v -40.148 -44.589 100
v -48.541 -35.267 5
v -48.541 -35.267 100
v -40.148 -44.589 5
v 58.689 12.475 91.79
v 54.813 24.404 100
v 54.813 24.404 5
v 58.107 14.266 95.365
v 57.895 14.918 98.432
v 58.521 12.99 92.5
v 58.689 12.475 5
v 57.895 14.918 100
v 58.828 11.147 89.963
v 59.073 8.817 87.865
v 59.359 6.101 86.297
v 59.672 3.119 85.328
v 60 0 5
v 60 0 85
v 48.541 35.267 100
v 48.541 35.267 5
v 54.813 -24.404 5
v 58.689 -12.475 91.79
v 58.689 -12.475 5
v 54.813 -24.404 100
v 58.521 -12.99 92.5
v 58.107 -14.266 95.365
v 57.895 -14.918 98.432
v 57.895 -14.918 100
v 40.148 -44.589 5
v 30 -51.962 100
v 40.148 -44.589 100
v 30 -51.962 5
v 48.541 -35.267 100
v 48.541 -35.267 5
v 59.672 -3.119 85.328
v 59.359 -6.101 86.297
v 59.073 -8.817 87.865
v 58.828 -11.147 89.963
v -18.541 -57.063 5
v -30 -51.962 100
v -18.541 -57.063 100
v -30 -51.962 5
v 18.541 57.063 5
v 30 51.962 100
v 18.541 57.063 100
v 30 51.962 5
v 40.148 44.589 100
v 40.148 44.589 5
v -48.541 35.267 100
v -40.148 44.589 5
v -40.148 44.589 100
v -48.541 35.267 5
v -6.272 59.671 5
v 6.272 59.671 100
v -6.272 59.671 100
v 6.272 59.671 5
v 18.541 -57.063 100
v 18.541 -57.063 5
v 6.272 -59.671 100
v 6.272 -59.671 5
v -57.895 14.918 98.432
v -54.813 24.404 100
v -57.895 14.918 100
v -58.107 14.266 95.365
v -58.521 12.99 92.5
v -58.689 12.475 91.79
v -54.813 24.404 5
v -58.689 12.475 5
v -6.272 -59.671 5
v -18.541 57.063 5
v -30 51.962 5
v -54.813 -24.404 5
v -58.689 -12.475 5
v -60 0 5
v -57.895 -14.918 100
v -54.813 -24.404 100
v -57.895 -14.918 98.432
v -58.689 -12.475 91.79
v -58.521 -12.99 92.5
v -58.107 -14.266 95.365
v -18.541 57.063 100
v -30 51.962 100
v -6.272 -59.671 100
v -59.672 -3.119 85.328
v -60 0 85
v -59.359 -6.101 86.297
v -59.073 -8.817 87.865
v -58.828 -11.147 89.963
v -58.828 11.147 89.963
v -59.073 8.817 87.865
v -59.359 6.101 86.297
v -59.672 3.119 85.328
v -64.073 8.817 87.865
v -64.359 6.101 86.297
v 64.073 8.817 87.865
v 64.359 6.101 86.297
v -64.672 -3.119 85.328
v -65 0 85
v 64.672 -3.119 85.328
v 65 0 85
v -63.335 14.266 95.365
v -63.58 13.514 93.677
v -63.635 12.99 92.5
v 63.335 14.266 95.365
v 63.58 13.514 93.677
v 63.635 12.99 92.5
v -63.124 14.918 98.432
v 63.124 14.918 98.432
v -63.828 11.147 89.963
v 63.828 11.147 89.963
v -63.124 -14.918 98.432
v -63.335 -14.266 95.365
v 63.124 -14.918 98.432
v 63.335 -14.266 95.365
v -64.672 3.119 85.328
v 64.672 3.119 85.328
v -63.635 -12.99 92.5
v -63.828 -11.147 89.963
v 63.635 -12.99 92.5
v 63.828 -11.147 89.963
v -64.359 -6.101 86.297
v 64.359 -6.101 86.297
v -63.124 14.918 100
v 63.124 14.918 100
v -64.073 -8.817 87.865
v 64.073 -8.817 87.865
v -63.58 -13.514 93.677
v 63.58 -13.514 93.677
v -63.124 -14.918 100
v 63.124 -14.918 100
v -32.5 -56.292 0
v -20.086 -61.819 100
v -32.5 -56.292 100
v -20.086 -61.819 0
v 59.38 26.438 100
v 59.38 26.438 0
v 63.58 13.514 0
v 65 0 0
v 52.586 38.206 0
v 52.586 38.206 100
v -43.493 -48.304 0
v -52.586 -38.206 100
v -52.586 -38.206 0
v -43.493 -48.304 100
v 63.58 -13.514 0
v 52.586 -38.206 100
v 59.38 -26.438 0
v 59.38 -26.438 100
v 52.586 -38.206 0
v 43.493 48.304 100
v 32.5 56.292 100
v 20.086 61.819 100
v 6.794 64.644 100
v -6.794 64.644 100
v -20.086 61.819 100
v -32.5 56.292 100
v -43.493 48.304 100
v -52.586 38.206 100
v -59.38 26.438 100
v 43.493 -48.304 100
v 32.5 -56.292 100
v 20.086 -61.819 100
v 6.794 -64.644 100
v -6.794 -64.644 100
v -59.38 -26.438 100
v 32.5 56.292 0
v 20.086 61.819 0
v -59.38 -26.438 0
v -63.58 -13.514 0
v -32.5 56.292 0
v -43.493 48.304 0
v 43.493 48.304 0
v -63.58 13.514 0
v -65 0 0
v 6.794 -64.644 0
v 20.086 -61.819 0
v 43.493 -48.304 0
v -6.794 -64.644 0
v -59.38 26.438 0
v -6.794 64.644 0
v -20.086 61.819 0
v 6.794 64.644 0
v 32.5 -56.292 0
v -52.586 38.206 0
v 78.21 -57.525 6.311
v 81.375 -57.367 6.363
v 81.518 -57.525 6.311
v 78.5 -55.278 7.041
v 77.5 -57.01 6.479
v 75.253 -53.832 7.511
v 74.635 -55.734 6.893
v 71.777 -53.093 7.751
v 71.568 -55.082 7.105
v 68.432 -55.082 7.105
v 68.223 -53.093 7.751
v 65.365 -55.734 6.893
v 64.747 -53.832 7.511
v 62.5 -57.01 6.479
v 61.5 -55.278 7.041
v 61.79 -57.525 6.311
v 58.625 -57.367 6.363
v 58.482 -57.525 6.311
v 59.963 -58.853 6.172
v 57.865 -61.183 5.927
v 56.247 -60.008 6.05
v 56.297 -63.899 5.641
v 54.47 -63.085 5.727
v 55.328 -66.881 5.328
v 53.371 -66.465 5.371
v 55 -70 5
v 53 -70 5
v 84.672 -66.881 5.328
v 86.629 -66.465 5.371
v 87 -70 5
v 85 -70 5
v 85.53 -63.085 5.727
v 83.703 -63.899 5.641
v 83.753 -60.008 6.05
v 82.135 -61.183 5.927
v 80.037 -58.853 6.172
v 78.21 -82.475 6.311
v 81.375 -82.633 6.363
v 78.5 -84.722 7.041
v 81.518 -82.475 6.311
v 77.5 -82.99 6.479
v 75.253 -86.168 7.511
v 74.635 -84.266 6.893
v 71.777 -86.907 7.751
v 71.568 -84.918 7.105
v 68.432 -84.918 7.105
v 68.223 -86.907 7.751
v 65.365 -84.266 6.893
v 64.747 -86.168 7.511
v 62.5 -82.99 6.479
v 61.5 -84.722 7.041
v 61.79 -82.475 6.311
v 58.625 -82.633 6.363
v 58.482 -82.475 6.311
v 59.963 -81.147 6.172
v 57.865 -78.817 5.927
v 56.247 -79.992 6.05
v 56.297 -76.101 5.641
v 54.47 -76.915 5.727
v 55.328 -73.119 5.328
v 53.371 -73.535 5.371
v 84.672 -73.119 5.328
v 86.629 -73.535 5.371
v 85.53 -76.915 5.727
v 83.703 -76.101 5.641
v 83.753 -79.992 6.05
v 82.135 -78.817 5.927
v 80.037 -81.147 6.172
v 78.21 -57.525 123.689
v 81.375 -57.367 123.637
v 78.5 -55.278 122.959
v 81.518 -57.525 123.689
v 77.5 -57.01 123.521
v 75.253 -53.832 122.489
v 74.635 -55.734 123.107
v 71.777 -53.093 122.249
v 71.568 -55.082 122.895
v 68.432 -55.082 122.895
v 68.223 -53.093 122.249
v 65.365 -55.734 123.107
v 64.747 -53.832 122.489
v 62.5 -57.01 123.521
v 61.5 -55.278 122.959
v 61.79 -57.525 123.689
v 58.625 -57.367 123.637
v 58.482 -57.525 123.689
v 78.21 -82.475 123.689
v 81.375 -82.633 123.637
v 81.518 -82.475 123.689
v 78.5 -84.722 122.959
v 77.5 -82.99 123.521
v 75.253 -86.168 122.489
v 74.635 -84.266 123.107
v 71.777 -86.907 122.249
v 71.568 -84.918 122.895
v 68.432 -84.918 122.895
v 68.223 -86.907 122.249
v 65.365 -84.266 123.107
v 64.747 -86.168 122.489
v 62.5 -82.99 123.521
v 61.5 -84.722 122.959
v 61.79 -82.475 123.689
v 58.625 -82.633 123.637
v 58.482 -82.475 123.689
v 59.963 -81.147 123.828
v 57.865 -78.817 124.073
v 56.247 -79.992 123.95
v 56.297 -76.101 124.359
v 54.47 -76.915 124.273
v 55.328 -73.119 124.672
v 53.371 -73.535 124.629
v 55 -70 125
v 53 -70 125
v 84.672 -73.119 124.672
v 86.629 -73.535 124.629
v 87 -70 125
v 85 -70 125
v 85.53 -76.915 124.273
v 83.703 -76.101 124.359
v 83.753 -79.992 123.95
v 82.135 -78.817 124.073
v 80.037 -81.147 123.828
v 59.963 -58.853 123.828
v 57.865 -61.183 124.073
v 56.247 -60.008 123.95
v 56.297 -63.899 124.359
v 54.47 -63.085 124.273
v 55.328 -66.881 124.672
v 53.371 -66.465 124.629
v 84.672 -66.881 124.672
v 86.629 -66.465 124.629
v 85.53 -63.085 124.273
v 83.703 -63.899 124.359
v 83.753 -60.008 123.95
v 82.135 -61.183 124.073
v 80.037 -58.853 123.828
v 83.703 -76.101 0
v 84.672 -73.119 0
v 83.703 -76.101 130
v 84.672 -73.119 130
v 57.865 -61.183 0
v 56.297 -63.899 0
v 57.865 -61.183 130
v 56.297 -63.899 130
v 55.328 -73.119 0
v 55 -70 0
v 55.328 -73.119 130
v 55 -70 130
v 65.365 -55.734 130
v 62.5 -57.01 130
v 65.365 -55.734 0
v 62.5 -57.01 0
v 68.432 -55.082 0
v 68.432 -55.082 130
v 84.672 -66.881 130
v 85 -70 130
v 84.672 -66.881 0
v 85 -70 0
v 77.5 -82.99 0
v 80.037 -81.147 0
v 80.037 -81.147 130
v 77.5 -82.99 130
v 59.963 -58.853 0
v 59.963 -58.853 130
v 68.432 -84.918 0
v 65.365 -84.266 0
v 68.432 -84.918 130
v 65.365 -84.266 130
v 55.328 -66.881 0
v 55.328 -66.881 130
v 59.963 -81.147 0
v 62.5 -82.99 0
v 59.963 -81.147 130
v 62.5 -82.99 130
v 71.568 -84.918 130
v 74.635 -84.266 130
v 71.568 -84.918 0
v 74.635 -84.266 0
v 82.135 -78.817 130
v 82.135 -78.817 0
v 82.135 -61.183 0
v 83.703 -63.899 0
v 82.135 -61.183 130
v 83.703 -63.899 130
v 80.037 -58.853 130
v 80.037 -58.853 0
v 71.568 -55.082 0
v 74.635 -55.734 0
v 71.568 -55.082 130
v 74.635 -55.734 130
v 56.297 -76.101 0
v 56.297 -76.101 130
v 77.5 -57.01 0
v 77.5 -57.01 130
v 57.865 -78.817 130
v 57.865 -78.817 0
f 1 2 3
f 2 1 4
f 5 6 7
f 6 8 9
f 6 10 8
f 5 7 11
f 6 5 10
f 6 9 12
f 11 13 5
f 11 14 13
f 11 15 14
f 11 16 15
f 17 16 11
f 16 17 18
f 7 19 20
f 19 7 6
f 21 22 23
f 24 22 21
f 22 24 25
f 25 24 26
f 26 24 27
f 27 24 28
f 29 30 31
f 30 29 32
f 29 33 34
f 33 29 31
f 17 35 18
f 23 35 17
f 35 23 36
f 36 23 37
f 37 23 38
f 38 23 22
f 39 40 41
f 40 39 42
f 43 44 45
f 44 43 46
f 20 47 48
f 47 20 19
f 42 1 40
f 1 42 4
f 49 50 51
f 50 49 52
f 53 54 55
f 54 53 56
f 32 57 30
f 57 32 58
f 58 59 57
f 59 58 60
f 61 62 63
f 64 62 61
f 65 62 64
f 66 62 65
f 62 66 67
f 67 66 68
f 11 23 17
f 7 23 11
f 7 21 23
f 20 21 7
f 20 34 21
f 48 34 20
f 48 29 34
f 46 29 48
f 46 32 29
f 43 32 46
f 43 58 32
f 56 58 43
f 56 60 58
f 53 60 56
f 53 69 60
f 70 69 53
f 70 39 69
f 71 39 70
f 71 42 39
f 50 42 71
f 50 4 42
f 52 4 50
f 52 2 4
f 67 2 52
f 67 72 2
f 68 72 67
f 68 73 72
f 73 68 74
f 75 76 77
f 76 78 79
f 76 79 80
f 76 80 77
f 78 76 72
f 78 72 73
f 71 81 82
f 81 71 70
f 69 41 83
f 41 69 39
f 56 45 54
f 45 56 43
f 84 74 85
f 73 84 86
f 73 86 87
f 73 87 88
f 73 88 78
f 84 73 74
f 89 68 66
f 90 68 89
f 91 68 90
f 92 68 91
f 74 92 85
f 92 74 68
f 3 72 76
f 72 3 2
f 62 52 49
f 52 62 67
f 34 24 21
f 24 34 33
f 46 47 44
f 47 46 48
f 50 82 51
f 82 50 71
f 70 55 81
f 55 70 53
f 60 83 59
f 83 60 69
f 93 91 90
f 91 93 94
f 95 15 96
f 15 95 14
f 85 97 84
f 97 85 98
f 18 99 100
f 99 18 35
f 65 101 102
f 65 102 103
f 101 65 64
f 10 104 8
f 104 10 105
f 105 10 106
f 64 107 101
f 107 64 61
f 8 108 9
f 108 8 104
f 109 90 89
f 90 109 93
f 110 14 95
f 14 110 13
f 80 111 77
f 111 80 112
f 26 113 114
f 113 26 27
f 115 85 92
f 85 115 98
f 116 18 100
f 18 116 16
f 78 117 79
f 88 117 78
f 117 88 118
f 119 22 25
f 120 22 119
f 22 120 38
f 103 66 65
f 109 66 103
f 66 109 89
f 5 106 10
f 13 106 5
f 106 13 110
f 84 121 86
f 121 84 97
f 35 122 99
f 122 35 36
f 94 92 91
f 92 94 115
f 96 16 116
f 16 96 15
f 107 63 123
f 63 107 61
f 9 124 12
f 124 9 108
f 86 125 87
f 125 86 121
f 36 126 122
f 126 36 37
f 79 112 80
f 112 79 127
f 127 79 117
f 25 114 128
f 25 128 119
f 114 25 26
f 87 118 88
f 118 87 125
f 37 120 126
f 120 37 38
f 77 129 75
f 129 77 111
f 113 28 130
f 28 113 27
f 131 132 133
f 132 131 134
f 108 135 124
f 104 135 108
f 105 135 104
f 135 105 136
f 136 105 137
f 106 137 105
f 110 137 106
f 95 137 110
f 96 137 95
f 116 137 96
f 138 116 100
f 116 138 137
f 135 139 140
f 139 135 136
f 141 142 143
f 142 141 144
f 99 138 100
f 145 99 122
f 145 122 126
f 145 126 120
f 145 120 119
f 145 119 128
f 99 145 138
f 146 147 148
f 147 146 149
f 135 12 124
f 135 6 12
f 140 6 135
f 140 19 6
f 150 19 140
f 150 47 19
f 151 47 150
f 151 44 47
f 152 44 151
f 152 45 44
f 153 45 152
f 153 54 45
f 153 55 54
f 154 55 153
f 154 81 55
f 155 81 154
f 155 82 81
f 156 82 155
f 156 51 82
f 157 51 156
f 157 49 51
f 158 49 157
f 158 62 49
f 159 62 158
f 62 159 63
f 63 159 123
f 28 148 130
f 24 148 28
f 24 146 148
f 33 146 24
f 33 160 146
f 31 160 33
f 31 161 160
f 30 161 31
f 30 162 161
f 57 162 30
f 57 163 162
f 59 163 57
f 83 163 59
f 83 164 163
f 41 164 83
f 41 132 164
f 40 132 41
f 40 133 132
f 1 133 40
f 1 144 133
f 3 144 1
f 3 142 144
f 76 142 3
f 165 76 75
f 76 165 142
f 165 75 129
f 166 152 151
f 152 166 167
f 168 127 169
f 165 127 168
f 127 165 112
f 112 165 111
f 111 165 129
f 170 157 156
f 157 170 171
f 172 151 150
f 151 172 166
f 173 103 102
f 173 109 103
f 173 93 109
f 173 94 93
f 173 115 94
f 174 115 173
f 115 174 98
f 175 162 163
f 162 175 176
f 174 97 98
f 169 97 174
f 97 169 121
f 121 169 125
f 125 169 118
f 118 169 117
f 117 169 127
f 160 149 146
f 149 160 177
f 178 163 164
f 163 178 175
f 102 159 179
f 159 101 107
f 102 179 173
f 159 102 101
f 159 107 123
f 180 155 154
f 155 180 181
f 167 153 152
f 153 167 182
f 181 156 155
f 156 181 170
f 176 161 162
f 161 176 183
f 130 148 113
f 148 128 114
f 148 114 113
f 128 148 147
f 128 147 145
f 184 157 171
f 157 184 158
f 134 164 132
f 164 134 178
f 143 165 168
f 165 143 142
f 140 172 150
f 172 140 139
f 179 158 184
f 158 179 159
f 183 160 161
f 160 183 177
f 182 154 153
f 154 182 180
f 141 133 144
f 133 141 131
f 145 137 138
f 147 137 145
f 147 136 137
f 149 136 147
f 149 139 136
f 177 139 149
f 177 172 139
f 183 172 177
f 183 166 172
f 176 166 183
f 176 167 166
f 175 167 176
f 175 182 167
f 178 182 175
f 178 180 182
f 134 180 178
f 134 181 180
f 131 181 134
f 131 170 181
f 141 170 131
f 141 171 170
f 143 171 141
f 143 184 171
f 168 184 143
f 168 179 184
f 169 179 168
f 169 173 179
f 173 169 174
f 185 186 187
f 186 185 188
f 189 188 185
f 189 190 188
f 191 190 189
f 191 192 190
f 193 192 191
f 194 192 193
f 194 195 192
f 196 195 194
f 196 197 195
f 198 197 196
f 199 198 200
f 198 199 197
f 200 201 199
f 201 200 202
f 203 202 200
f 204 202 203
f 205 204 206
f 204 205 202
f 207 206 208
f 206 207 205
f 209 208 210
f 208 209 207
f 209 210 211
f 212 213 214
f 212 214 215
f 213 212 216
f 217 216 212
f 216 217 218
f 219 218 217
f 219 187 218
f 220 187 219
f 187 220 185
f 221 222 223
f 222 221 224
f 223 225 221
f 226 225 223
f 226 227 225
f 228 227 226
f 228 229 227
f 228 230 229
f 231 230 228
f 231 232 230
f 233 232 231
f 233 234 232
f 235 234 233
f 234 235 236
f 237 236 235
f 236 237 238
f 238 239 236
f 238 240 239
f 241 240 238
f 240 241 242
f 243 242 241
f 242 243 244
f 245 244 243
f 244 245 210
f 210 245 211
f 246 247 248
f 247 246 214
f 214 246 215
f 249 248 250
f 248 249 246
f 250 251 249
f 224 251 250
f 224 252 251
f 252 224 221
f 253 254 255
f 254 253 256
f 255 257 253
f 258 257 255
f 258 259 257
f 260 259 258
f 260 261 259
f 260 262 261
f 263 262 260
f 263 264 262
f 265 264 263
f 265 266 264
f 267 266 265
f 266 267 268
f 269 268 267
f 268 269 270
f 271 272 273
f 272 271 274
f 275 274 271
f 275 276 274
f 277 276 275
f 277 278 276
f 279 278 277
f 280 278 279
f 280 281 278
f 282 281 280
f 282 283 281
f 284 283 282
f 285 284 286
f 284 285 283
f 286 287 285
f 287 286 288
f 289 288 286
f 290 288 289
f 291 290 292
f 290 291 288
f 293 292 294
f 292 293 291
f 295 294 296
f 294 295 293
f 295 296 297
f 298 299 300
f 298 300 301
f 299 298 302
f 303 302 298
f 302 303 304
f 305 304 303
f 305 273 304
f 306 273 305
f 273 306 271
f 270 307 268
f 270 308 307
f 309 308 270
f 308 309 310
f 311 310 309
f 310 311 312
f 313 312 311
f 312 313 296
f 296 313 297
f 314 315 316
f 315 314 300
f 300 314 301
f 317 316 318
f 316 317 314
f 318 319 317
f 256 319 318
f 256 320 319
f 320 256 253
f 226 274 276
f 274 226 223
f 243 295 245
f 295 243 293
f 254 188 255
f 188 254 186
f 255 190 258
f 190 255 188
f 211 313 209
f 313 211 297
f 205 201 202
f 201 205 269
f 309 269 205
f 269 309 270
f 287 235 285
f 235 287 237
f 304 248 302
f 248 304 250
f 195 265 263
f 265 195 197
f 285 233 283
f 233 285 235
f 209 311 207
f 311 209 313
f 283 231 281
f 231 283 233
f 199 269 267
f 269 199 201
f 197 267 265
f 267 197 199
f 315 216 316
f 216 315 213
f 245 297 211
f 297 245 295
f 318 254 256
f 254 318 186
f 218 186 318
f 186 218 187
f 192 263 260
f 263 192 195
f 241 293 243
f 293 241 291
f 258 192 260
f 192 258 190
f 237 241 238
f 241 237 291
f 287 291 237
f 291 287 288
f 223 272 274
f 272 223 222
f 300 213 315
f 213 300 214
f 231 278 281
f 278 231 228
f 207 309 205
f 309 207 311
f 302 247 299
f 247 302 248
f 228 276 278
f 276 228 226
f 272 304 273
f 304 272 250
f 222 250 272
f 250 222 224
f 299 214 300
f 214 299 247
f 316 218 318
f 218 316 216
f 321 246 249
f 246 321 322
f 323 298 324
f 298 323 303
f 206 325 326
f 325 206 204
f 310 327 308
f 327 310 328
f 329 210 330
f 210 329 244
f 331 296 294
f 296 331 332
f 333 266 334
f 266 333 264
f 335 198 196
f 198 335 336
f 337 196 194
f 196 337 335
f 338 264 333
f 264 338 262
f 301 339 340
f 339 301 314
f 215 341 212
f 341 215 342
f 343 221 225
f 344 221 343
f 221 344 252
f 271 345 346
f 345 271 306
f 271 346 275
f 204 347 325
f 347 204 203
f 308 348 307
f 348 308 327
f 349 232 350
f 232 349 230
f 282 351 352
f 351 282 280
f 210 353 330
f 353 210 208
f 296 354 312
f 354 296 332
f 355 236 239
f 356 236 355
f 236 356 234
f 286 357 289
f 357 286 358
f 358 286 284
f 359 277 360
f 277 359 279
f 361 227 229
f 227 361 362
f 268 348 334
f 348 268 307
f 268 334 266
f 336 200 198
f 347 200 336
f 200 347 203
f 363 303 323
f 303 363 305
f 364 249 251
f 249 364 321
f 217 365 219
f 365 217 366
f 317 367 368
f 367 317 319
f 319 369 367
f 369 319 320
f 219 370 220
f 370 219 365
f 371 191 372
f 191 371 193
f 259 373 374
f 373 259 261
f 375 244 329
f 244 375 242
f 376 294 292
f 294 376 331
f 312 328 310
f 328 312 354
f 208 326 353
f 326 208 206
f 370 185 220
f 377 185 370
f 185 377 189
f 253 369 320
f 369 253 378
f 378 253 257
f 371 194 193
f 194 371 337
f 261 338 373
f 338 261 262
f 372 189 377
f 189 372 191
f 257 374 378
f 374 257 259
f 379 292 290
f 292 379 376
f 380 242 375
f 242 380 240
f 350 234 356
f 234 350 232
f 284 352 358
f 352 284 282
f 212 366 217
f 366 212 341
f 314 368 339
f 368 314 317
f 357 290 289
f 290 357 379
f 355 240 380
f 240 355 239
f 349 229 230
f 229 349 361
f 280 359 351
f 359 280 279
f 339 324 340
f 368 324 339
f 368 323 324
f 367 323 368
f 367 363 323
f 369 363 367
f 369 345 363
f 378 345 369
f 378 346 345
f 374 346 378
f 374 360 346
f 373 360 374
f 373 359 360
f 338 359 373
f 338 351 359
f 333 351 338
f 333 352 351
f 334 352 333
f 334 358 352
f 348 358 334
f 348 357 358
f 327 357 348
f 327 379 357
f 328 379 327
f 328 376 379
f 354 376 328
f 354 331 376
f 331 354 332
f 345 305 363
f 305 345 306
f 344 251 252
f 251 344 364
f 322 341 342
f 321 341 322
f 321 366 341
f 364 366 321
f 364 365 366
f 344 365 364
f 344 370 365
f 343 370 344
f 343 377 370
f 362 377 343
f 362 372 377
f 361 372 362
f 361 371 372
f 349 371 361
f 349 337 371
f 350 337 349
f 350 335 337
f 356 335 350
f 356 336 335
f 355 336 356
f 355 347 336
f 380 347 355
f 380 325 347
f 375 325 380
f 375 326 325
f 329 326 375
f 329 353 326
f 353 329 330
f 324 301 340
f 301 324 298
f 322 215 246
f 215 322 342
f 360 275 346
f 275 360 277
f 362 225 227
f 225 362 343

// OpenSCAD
width = 130;
height = 100;
thick = 5;
rodthick = 30;
rodthick_inner = 34;
printBase = true;
printRod = true;

if(printBase) {
    difference() {
        cylinder(height,width/2,width/2);
        union() {
            translate([0,0,thick])cylinder(height,width/2-thick,width/2-thick); //inner cylinder
            translate([-width/2,0,height])rotate([0,90,0])cylinder(width+2,rodthick/2,rodthick/2); //rod_holes
        }
    }
}

if(printRod) {
    translate([-30,-70,width/2])rotate([0,90,0])
    union() {
        translate([-width/2,0,height])rotate([0,90,0])cylinder(width,rodthick/2,rodthick/2);
        intersection() {
            translate([0,0,height/2])cylinder(height,width/2-thick,width/2-thick); //inner cylinder
            translate([-width/2,0,height])rotate([0,90,0])cylinder(width,rodthick_inner/2,rodthick_inner/2);
        }
    }
}
